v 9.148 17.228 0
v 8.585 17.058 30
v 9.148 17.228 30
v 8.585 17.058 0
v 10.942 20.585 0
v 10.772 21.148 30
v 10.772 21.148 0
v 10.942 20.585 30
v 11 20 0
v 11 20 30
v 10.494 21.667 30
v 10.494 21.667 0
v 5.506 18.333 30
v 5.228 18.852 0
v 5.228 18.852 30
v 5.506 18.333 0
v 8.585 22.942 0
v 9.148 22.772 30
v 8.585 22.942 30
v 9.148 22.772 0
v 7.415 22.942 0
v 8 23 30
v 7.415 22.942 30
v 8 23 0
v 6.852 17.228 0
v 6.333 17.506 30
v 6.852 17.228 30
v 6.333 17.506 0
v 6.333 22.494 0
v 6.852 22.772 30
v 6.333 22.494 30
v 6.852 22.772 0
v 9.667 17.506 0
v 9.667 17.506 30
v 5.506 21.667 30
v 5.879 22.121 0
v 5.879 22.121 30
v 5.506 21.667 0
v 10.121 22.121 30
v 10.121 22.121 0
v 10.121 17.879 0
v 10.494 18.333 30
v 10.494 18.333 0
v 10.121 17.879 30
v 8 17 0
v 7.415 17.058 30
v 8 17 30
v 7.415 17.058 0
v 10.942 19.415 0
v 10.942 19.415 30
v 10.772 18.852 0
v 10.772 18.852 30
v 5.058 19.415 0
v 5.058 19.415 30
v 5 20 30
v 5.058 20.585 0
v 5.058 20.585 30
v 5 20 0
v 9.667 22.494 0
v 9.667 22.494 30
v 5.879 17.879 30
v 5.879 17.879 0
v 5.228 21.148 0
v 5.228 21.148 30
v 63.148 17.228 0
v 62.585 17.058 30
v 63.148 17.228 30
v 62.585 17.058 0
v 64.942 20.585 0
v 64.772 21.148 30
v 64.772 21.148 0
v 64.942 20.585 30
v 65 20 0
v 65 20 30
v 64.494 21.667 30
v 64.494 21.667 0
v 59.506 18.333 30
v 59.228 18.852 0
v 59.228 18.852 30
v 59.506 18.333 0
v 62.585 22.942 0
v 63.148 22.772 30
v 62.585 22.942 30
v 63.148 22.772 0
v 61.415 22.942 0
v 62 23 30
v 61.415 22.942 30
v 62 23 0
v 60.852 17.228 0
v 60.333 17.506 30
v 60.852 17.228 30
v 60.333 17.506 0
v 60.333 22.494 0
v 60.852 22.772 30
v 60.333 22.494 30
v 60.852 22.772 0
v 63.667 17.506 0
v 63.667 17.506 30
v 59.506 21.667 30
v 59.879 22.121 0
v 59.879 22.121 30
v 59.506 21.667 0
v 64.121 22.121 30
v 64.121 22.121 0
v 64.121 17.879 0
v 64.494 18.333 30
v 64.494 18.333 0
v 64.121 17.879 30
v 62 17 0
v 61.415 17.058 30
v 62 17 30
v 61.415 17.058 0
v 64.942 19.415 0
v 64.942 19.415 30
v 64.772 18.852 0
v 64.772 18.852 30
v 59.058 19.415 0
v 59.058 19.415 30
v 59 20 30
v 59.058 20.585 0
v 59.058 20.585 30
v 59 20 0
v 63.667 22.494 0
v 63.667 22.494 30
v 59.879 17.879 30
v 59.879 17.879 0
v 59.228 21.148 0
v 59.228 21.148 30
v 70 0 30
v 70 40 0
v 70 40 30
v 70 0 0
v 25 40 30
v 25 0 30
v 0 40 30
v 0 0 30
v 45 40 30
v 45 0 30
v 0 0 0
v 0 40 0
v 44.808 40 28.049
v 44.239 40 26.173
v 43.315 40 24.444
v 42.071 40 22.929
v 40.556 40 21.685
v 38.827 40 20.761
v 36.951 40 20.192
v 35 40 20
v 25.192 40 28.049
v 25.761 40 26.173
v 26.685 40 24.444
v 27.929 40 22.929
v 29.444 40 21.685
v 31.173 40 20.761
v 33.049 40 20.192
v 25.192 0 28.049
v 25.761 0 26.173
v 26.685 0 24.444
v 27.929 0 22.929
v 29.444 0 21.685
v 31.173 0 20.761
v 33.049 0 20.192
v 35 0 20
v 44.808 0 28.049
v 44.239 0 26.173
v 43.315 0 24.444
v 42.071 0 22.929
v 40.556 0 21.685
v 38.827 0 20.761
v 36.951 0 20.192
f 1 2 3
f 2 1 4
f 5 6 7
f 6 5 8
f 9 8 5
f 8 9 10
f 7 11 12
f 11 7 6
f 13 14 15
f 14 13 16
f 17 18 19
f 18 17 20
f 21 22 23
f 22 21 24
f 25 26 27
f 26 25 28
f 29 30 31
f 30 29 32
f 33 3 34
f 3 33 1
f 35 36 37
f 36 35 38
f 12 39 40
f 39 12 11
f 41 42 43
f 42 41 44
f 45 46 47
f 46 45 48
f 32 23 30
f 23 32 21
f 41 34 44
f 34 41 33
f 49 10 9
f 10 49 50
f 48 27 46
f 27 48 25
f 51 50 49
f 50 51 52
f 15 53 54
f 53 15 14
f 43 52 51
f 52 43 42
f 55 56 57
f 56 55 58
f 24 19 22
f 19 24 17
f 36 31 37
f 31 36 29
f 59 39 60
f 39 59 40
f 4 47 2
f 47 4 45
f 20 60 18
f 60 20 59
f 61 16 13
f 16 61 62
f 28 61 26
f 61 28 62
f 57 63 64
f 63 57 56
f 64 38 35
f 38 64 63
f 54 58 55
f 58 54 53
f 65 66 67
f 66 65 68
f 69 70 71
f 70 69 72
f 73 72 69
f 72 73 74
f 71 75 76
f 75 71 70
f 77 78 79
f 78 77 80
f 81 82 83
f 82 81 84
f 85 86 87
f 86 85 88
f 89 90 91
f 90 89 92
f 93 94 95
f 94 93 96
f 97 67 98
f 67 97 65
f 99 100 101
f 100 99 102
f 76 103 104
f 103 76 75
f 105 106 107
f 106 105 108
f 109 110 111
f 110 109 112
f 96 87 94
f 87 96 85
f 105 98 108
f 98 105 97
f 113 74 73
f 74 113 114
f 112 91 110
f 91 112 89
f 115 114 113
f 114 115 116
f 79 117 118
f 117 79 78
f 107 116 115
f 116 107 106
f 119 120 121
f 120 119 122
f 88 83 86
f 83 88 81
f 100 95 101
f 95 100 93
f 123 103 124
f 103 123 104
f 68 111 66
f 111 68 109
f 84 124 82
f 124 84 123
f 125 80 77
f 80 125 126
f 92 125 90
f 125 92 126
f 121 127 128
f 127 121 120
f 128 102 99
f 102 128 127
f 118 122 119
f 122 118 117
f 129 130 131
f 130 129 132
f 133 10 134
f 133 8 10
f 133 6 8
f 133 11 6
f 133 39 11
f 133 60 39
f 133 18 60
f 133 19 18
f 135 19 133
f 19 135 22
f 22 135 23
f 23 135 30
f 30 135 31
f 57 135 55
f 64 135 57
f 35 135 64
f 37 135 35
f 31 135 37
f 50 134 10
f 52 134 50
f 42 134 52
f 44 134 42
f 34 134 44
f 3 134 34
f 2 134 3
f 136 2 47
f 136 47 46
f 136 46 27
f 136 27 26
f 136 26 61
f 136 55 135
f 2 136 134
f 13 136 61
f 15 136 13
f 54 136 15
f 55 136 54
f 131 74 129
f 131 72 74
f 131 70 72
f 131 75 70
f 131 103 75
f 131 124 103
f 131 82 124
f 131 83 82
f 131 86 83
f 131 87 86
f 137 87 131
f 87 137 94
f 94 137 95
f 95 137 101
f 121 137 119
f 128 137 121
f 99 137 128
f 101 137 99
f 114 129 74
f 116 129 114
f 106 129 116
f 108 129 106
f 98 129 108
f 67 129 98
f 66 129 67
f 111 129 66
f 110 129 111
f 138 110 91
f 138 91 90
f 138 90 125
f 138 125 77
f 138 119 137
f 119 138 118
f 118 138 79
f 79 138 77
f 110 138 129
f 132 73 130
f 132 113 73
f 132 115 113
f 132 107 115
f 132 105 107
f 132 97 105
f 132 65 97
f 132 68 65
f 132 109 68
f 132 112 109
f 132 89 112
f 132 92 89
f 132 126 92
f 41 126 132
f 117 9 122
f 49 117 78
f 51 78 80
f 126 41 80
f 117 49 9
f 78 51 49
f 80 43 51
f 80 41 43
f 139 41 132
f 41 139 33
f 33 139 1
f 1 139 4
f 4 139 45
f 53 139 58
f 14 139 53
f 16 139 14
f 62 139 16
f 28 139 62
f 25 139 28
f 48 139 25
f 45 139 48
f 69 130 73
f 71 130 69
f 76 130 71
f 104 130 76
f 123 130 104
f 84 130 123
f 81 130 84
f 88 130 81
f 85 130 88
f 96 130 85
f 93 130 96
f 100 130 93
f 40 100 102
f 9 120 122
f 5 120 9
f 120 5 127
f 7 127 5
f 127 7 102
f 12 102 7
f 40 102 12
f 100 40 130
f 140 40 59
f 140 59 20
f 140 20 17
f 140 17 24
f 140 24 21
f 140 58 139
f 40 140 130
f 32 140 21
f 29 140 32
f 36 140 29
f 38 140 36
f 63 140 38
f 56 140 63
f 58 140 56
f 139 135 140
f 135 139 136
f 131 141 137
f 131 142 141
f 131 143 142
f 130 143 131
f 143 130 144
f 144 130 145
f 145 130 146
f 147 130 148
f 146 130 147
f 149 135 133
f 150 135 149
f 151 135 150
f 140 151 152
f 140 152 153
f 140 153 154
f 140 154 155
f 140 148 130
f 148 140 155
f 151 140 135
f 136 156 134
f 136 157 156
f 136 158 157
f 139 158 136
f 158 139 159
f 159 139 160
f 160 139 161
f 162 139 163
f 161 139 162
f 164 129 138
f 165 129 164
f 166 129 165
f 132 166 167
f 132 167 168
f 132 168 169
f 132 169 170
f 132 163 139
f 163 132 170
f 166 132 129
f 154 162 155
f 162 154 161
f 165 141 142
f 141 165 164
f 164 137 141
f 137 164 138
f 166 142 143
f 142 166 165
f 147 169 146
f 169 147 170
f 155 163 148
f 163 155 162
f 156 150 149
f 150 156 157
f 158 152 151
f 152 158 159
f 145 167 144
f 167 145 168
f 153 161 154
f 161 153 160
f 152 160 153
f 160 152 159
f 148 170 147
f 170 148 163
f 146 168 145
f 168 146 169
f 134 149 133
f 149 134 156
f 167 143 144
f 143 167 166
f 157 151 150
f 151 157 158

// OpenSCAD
$fn = 32;

// ----------------------------------------------------------------------
// Saddle clamp: plain shaft clamp
// ----------------------------------------------------------------------

// --- parameters (mm) ---
blk_l = 70;               // block length, X
blk_w = 40;               // block width, Y
blk_h = 30;               // block height
clamp_r = 10;             // shaft groove radius
hole_r = 3;               // bolt hole radius
hole_m = 8;               // bolt hole margin from the ends

saw_depth = clamp_r + 3;  // saw kerf depth

difference() {
  cube([blk_l, blk_w, blk_h]);
  translate([blk_l / 2, -1, blk_h])
    rotate([-90, 0, 0])
      cylinder(h = blk_w + 2, r = clamp_r);
  for (sx = [0, 1])
    translate([sx ? blk_l - hole_m : hole_m, blk_w / 2, -1])
      cylinder(r = hole_r, h = blk_h + 2);
}
